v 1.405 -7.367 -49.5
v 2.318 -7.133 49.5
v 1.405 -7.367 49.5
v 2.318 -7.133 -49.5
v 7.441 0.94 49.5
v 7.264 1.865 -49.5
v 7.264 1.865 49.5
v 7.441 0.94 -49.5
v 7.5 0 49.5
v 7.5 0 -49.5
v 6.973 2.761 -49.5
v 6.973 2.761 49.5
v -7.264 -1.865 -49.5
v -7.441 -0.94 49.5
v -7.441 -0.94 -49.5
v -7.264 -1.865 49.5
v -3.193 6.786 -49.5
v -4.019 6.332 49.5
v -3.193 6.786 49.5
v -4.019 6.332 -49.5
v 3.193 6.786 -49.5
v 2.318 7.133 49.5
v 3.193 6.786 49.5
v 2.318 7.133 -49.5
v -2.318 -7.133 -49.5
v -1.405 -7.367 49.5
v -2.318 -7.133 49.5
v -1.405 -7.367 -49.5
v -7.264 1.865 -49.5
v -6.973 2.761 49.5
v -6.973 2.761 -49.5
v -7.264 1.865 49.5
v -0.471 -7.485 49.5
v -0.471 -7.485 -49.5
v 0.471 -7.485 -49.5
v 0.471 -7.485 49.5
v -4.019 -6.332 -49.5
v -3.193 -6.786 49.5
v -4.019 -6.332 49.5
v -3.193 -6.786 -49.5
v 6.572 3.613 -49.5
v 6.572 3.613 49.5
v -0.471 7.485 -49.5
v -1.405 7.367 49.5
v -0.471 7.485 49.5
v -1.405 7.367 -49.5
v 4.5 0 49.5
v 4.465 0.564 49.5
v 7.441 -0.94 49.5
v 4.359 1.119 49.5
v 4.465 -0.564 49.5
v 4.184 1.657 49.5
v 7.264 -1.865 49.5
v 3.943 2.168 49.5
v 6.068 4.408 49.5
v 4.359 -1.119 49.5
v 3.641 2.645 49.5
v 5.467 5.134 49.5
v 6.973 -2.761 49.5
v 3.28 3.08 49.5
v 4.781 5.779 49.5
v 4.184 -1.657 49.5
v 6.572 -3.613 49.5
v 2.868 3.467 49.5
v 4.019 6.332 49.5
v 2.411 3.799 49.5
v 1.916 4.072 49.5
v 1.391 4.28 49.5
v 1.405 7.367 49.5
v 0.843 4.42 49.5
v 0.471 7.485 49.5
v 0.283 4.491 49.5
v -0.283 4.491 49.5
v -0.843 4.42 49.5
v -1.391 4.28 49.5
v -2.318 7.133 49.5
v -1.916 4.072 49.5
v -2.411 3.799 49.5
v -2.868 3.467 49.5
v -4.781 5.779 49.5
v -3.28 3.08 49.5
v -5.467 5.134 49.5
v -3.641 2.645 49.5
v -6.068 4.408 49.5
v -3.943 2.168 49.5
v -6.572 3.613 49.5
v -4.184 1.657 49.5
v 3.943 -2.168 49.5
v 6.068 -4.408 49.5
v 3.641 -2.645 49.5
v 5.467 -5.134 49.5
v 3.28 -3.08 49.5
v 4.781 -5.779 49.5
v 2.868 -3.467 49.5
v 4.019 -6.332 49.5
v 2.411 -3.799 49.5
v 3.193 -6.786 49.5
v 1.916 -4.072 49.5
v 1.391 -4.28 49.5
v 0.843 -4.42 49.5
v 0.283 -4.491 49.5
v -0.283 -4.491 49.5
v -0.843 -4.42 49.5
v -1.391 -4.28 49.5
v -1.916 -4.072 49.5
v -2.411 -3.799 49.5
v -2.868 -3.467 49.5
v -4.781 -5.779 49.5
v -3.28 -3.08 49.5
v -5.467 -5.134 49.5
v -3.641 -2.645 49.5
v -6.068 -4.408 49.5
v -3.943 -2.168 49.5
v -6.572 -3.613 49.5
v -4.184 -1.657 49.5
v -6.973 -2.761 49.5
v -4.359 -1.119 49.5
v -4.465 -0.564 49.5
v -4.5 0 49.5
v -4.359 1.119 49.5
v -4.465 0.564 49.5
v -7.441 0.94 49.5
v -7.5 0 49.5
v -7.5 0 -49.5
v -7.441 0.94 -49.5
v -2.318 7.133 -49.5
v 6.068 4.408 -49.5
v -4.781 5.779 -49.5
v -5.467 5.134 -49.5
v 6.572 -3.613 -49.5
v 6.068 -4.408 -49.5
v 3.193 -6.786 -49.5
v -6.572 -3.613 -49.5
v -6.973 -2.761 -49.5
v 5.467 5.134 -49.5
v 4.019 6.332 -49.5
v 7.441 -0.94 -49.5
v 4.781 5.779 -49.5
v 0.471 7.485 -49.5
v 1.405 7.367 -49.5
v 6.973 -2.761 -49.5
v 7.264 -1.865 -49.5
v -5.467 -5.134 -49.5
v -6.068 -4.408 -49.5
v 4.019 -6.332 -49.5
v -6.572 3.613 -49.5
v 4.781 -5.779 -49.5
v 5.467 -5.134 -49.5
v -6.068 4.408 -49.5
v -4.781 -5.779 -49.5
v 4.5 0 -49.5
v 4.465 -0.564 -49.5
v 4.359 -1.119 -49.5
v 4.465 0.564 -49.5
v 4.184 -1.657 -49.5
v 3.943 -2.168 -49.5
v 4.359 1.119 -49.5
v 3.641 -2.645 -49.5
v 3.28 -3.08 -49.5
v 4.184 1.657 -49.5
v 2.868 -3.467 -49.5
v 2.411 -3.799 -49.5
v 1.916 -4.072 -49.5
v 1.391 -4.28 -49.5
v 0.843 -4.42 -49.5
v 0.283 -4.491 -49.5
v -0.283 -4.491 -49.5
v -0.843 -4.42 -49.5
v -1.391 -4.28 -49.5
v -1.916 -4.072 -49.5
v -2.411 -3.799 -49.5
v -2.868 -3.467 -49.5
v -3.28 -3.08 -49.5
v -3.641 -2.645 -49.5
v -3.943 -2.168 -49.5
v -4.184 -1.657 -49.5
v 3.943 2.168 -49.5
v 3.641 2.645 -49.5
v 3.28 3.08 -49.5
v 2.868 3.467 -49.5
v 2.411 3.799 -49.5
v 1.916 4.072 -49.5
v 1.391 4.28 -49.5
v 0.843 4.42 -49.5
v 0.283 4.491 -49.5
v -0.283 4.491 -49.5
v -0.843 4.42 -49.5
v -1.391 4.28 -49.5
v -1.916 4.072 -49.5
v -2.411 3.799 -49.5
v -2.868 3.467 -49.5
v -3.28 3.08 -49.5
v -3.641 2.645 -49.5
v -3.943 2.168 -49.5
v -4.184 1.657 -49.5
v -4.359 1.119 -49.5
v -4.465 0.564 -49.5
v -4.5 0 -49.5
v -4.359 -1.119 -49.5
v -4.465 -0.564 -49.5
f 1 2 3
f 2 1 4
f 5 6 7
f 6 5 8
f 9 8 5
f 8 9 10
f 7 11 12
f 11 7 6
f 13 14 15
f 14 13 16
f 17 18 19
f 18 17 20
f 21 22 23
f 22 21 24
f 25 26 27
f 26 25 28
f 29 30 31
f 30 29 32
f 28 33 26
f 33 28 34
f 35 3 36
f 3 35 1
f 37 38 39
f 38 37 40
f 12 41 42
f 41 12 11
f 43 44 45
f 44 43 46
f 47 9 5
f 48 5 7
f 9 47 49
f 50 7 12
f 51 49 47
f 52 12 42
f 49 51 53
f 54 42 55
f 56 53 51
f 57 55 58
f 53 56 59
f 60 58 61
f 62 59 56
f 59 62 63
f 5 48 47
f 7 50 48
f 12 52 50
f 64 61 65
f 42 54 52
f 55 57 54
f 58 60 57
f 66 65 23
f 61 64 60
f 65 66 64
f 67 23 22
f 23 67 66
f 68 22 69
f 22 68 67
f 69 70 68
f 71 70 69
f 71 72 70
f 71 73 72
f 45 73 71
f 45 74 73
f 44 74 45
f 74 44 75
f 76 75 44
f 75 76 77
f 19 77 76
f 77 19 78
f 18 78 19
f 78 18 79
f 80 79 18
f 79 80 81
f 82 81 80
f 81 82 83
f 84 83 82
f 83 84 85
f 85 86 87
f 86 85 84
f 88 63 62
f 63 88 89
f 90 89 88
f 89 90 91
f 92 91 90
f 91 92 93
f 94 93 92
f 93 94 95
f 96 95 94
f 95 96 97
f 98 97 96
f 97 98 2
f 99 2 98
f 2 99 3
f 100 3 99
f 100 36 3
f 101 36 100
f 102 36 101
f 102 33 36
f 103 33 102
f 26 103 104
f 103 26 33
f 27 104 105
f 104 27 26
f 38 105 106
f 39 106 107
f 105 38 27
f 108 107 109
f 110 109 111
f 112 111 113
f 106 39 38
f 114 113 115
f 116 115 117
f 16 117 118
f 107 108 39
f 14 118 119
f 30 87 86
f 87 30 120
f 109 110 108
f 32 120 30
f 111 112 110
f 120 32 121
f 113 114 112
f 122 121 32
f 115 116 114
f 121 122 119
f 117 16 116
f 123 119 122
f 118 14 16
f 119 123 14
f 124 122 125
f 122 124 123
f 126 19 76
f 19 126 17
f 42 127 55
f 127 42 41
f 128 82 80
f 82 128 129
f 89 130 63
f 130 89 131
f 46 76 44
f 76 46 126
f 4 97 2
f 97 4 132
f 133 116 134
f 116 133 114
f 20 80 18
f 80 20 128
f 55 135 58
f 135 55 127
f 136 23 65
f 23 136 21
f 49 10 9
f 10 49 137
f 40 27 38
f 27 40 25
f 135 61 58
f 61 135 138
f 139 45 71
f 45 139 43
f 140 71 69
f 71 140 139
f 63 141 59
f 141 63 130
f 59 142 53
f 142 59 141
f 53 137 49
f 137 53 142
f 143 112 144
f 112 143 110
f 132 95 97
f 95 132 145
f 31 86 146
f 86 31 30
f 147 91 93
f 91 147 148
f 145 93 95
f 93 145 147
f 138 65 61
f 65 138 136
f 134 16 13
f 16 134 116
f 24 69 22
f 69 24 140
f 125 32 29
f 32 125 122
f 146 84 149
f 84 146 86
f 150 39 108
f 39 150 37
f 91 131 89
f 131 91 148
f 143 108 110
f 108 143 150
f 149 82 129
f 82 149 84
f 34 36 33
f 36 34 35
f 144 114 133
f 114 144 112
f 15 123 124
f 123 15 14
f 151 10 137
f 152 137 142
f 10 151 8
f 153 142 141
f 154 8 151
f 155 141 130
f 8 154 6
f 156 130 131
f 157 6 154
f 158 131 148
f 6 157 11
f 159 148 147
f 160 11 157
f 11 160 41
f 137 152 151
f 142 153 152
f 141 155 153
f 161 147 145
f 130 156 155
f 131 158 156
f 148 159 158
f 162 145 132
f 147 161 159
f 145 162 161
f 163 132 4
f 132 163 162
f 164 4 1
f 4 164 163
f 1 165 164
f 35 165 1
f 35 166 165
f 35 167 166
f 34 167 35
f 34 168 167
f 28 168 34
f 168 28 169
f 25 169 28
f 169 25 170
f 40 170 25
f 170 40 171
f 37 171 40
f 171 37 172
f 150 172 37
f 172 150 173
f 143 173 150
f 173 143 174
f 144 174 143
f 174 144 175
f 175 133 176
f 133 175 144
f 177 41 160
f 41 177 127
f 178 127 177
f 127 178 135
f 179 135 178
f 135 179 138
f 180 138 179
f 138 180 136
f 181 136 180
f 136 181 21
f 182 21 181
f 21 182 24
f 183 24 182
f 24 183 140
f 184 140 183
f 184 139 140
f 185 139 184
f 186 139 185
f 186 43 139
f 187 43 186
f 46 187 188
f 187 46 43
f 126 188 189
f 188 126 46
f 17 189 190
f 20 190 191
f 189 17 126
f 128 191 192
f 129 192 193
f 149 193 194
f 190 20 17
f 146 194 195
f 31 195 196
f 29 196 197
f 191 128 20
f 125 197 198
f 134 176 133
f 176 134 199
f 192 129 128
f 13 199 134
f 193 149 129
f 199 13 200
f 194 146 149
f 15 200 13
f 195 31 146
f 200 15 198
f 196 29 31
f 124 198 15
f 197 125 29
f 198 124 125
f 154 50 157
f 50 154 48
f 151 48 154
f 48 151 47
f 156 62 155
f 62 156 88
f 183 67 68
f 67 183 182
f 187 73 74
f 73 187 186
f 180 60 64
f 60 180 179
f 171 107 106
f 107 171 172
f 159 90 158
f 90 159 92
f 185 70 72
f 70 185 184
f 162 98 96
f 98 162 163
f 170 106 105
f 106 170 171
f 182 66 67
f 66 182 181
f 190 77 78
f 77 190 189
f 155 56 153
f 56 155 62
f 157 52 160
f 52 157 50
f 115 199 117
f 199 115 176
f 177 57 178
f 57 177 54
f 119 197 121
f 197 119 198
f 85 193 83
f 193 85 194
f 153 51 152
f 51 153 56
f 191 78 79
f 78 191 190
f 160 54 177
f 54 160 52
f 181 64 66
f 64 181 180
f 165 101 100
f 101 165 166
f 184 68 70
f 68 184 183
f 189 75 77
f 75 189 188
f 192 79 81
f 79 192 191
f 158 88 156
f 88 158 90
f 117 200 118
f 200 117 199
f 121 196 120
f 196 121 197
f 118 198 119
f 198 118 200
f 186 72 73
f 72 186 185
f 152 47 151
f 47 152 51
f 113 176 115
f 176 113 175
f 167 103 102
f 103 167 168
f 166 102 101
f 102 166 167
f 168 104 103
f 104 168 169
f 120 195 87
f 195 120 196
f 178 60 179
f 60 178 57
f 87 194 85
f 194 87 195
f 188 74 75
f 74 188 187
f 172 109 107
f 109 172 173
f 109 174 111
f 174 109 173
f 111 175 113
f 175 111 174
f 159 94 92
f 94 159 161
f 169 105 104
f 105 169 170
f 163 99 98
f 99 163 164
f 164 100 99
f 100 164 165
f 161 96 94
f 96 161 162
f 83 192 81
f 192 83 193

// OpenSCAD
$fn = 50;


difference() {
	union() {
		translate(v = [0, 0, -49.5000000000]) {
			cylinder(h = 99, r = 7.5000000000);
		}
	}
	union() {
		translate(v = [0, 0, -100.0000000000]) {
			cylinder(h = 200, r = 4.5000000000);
		}
	}
}
